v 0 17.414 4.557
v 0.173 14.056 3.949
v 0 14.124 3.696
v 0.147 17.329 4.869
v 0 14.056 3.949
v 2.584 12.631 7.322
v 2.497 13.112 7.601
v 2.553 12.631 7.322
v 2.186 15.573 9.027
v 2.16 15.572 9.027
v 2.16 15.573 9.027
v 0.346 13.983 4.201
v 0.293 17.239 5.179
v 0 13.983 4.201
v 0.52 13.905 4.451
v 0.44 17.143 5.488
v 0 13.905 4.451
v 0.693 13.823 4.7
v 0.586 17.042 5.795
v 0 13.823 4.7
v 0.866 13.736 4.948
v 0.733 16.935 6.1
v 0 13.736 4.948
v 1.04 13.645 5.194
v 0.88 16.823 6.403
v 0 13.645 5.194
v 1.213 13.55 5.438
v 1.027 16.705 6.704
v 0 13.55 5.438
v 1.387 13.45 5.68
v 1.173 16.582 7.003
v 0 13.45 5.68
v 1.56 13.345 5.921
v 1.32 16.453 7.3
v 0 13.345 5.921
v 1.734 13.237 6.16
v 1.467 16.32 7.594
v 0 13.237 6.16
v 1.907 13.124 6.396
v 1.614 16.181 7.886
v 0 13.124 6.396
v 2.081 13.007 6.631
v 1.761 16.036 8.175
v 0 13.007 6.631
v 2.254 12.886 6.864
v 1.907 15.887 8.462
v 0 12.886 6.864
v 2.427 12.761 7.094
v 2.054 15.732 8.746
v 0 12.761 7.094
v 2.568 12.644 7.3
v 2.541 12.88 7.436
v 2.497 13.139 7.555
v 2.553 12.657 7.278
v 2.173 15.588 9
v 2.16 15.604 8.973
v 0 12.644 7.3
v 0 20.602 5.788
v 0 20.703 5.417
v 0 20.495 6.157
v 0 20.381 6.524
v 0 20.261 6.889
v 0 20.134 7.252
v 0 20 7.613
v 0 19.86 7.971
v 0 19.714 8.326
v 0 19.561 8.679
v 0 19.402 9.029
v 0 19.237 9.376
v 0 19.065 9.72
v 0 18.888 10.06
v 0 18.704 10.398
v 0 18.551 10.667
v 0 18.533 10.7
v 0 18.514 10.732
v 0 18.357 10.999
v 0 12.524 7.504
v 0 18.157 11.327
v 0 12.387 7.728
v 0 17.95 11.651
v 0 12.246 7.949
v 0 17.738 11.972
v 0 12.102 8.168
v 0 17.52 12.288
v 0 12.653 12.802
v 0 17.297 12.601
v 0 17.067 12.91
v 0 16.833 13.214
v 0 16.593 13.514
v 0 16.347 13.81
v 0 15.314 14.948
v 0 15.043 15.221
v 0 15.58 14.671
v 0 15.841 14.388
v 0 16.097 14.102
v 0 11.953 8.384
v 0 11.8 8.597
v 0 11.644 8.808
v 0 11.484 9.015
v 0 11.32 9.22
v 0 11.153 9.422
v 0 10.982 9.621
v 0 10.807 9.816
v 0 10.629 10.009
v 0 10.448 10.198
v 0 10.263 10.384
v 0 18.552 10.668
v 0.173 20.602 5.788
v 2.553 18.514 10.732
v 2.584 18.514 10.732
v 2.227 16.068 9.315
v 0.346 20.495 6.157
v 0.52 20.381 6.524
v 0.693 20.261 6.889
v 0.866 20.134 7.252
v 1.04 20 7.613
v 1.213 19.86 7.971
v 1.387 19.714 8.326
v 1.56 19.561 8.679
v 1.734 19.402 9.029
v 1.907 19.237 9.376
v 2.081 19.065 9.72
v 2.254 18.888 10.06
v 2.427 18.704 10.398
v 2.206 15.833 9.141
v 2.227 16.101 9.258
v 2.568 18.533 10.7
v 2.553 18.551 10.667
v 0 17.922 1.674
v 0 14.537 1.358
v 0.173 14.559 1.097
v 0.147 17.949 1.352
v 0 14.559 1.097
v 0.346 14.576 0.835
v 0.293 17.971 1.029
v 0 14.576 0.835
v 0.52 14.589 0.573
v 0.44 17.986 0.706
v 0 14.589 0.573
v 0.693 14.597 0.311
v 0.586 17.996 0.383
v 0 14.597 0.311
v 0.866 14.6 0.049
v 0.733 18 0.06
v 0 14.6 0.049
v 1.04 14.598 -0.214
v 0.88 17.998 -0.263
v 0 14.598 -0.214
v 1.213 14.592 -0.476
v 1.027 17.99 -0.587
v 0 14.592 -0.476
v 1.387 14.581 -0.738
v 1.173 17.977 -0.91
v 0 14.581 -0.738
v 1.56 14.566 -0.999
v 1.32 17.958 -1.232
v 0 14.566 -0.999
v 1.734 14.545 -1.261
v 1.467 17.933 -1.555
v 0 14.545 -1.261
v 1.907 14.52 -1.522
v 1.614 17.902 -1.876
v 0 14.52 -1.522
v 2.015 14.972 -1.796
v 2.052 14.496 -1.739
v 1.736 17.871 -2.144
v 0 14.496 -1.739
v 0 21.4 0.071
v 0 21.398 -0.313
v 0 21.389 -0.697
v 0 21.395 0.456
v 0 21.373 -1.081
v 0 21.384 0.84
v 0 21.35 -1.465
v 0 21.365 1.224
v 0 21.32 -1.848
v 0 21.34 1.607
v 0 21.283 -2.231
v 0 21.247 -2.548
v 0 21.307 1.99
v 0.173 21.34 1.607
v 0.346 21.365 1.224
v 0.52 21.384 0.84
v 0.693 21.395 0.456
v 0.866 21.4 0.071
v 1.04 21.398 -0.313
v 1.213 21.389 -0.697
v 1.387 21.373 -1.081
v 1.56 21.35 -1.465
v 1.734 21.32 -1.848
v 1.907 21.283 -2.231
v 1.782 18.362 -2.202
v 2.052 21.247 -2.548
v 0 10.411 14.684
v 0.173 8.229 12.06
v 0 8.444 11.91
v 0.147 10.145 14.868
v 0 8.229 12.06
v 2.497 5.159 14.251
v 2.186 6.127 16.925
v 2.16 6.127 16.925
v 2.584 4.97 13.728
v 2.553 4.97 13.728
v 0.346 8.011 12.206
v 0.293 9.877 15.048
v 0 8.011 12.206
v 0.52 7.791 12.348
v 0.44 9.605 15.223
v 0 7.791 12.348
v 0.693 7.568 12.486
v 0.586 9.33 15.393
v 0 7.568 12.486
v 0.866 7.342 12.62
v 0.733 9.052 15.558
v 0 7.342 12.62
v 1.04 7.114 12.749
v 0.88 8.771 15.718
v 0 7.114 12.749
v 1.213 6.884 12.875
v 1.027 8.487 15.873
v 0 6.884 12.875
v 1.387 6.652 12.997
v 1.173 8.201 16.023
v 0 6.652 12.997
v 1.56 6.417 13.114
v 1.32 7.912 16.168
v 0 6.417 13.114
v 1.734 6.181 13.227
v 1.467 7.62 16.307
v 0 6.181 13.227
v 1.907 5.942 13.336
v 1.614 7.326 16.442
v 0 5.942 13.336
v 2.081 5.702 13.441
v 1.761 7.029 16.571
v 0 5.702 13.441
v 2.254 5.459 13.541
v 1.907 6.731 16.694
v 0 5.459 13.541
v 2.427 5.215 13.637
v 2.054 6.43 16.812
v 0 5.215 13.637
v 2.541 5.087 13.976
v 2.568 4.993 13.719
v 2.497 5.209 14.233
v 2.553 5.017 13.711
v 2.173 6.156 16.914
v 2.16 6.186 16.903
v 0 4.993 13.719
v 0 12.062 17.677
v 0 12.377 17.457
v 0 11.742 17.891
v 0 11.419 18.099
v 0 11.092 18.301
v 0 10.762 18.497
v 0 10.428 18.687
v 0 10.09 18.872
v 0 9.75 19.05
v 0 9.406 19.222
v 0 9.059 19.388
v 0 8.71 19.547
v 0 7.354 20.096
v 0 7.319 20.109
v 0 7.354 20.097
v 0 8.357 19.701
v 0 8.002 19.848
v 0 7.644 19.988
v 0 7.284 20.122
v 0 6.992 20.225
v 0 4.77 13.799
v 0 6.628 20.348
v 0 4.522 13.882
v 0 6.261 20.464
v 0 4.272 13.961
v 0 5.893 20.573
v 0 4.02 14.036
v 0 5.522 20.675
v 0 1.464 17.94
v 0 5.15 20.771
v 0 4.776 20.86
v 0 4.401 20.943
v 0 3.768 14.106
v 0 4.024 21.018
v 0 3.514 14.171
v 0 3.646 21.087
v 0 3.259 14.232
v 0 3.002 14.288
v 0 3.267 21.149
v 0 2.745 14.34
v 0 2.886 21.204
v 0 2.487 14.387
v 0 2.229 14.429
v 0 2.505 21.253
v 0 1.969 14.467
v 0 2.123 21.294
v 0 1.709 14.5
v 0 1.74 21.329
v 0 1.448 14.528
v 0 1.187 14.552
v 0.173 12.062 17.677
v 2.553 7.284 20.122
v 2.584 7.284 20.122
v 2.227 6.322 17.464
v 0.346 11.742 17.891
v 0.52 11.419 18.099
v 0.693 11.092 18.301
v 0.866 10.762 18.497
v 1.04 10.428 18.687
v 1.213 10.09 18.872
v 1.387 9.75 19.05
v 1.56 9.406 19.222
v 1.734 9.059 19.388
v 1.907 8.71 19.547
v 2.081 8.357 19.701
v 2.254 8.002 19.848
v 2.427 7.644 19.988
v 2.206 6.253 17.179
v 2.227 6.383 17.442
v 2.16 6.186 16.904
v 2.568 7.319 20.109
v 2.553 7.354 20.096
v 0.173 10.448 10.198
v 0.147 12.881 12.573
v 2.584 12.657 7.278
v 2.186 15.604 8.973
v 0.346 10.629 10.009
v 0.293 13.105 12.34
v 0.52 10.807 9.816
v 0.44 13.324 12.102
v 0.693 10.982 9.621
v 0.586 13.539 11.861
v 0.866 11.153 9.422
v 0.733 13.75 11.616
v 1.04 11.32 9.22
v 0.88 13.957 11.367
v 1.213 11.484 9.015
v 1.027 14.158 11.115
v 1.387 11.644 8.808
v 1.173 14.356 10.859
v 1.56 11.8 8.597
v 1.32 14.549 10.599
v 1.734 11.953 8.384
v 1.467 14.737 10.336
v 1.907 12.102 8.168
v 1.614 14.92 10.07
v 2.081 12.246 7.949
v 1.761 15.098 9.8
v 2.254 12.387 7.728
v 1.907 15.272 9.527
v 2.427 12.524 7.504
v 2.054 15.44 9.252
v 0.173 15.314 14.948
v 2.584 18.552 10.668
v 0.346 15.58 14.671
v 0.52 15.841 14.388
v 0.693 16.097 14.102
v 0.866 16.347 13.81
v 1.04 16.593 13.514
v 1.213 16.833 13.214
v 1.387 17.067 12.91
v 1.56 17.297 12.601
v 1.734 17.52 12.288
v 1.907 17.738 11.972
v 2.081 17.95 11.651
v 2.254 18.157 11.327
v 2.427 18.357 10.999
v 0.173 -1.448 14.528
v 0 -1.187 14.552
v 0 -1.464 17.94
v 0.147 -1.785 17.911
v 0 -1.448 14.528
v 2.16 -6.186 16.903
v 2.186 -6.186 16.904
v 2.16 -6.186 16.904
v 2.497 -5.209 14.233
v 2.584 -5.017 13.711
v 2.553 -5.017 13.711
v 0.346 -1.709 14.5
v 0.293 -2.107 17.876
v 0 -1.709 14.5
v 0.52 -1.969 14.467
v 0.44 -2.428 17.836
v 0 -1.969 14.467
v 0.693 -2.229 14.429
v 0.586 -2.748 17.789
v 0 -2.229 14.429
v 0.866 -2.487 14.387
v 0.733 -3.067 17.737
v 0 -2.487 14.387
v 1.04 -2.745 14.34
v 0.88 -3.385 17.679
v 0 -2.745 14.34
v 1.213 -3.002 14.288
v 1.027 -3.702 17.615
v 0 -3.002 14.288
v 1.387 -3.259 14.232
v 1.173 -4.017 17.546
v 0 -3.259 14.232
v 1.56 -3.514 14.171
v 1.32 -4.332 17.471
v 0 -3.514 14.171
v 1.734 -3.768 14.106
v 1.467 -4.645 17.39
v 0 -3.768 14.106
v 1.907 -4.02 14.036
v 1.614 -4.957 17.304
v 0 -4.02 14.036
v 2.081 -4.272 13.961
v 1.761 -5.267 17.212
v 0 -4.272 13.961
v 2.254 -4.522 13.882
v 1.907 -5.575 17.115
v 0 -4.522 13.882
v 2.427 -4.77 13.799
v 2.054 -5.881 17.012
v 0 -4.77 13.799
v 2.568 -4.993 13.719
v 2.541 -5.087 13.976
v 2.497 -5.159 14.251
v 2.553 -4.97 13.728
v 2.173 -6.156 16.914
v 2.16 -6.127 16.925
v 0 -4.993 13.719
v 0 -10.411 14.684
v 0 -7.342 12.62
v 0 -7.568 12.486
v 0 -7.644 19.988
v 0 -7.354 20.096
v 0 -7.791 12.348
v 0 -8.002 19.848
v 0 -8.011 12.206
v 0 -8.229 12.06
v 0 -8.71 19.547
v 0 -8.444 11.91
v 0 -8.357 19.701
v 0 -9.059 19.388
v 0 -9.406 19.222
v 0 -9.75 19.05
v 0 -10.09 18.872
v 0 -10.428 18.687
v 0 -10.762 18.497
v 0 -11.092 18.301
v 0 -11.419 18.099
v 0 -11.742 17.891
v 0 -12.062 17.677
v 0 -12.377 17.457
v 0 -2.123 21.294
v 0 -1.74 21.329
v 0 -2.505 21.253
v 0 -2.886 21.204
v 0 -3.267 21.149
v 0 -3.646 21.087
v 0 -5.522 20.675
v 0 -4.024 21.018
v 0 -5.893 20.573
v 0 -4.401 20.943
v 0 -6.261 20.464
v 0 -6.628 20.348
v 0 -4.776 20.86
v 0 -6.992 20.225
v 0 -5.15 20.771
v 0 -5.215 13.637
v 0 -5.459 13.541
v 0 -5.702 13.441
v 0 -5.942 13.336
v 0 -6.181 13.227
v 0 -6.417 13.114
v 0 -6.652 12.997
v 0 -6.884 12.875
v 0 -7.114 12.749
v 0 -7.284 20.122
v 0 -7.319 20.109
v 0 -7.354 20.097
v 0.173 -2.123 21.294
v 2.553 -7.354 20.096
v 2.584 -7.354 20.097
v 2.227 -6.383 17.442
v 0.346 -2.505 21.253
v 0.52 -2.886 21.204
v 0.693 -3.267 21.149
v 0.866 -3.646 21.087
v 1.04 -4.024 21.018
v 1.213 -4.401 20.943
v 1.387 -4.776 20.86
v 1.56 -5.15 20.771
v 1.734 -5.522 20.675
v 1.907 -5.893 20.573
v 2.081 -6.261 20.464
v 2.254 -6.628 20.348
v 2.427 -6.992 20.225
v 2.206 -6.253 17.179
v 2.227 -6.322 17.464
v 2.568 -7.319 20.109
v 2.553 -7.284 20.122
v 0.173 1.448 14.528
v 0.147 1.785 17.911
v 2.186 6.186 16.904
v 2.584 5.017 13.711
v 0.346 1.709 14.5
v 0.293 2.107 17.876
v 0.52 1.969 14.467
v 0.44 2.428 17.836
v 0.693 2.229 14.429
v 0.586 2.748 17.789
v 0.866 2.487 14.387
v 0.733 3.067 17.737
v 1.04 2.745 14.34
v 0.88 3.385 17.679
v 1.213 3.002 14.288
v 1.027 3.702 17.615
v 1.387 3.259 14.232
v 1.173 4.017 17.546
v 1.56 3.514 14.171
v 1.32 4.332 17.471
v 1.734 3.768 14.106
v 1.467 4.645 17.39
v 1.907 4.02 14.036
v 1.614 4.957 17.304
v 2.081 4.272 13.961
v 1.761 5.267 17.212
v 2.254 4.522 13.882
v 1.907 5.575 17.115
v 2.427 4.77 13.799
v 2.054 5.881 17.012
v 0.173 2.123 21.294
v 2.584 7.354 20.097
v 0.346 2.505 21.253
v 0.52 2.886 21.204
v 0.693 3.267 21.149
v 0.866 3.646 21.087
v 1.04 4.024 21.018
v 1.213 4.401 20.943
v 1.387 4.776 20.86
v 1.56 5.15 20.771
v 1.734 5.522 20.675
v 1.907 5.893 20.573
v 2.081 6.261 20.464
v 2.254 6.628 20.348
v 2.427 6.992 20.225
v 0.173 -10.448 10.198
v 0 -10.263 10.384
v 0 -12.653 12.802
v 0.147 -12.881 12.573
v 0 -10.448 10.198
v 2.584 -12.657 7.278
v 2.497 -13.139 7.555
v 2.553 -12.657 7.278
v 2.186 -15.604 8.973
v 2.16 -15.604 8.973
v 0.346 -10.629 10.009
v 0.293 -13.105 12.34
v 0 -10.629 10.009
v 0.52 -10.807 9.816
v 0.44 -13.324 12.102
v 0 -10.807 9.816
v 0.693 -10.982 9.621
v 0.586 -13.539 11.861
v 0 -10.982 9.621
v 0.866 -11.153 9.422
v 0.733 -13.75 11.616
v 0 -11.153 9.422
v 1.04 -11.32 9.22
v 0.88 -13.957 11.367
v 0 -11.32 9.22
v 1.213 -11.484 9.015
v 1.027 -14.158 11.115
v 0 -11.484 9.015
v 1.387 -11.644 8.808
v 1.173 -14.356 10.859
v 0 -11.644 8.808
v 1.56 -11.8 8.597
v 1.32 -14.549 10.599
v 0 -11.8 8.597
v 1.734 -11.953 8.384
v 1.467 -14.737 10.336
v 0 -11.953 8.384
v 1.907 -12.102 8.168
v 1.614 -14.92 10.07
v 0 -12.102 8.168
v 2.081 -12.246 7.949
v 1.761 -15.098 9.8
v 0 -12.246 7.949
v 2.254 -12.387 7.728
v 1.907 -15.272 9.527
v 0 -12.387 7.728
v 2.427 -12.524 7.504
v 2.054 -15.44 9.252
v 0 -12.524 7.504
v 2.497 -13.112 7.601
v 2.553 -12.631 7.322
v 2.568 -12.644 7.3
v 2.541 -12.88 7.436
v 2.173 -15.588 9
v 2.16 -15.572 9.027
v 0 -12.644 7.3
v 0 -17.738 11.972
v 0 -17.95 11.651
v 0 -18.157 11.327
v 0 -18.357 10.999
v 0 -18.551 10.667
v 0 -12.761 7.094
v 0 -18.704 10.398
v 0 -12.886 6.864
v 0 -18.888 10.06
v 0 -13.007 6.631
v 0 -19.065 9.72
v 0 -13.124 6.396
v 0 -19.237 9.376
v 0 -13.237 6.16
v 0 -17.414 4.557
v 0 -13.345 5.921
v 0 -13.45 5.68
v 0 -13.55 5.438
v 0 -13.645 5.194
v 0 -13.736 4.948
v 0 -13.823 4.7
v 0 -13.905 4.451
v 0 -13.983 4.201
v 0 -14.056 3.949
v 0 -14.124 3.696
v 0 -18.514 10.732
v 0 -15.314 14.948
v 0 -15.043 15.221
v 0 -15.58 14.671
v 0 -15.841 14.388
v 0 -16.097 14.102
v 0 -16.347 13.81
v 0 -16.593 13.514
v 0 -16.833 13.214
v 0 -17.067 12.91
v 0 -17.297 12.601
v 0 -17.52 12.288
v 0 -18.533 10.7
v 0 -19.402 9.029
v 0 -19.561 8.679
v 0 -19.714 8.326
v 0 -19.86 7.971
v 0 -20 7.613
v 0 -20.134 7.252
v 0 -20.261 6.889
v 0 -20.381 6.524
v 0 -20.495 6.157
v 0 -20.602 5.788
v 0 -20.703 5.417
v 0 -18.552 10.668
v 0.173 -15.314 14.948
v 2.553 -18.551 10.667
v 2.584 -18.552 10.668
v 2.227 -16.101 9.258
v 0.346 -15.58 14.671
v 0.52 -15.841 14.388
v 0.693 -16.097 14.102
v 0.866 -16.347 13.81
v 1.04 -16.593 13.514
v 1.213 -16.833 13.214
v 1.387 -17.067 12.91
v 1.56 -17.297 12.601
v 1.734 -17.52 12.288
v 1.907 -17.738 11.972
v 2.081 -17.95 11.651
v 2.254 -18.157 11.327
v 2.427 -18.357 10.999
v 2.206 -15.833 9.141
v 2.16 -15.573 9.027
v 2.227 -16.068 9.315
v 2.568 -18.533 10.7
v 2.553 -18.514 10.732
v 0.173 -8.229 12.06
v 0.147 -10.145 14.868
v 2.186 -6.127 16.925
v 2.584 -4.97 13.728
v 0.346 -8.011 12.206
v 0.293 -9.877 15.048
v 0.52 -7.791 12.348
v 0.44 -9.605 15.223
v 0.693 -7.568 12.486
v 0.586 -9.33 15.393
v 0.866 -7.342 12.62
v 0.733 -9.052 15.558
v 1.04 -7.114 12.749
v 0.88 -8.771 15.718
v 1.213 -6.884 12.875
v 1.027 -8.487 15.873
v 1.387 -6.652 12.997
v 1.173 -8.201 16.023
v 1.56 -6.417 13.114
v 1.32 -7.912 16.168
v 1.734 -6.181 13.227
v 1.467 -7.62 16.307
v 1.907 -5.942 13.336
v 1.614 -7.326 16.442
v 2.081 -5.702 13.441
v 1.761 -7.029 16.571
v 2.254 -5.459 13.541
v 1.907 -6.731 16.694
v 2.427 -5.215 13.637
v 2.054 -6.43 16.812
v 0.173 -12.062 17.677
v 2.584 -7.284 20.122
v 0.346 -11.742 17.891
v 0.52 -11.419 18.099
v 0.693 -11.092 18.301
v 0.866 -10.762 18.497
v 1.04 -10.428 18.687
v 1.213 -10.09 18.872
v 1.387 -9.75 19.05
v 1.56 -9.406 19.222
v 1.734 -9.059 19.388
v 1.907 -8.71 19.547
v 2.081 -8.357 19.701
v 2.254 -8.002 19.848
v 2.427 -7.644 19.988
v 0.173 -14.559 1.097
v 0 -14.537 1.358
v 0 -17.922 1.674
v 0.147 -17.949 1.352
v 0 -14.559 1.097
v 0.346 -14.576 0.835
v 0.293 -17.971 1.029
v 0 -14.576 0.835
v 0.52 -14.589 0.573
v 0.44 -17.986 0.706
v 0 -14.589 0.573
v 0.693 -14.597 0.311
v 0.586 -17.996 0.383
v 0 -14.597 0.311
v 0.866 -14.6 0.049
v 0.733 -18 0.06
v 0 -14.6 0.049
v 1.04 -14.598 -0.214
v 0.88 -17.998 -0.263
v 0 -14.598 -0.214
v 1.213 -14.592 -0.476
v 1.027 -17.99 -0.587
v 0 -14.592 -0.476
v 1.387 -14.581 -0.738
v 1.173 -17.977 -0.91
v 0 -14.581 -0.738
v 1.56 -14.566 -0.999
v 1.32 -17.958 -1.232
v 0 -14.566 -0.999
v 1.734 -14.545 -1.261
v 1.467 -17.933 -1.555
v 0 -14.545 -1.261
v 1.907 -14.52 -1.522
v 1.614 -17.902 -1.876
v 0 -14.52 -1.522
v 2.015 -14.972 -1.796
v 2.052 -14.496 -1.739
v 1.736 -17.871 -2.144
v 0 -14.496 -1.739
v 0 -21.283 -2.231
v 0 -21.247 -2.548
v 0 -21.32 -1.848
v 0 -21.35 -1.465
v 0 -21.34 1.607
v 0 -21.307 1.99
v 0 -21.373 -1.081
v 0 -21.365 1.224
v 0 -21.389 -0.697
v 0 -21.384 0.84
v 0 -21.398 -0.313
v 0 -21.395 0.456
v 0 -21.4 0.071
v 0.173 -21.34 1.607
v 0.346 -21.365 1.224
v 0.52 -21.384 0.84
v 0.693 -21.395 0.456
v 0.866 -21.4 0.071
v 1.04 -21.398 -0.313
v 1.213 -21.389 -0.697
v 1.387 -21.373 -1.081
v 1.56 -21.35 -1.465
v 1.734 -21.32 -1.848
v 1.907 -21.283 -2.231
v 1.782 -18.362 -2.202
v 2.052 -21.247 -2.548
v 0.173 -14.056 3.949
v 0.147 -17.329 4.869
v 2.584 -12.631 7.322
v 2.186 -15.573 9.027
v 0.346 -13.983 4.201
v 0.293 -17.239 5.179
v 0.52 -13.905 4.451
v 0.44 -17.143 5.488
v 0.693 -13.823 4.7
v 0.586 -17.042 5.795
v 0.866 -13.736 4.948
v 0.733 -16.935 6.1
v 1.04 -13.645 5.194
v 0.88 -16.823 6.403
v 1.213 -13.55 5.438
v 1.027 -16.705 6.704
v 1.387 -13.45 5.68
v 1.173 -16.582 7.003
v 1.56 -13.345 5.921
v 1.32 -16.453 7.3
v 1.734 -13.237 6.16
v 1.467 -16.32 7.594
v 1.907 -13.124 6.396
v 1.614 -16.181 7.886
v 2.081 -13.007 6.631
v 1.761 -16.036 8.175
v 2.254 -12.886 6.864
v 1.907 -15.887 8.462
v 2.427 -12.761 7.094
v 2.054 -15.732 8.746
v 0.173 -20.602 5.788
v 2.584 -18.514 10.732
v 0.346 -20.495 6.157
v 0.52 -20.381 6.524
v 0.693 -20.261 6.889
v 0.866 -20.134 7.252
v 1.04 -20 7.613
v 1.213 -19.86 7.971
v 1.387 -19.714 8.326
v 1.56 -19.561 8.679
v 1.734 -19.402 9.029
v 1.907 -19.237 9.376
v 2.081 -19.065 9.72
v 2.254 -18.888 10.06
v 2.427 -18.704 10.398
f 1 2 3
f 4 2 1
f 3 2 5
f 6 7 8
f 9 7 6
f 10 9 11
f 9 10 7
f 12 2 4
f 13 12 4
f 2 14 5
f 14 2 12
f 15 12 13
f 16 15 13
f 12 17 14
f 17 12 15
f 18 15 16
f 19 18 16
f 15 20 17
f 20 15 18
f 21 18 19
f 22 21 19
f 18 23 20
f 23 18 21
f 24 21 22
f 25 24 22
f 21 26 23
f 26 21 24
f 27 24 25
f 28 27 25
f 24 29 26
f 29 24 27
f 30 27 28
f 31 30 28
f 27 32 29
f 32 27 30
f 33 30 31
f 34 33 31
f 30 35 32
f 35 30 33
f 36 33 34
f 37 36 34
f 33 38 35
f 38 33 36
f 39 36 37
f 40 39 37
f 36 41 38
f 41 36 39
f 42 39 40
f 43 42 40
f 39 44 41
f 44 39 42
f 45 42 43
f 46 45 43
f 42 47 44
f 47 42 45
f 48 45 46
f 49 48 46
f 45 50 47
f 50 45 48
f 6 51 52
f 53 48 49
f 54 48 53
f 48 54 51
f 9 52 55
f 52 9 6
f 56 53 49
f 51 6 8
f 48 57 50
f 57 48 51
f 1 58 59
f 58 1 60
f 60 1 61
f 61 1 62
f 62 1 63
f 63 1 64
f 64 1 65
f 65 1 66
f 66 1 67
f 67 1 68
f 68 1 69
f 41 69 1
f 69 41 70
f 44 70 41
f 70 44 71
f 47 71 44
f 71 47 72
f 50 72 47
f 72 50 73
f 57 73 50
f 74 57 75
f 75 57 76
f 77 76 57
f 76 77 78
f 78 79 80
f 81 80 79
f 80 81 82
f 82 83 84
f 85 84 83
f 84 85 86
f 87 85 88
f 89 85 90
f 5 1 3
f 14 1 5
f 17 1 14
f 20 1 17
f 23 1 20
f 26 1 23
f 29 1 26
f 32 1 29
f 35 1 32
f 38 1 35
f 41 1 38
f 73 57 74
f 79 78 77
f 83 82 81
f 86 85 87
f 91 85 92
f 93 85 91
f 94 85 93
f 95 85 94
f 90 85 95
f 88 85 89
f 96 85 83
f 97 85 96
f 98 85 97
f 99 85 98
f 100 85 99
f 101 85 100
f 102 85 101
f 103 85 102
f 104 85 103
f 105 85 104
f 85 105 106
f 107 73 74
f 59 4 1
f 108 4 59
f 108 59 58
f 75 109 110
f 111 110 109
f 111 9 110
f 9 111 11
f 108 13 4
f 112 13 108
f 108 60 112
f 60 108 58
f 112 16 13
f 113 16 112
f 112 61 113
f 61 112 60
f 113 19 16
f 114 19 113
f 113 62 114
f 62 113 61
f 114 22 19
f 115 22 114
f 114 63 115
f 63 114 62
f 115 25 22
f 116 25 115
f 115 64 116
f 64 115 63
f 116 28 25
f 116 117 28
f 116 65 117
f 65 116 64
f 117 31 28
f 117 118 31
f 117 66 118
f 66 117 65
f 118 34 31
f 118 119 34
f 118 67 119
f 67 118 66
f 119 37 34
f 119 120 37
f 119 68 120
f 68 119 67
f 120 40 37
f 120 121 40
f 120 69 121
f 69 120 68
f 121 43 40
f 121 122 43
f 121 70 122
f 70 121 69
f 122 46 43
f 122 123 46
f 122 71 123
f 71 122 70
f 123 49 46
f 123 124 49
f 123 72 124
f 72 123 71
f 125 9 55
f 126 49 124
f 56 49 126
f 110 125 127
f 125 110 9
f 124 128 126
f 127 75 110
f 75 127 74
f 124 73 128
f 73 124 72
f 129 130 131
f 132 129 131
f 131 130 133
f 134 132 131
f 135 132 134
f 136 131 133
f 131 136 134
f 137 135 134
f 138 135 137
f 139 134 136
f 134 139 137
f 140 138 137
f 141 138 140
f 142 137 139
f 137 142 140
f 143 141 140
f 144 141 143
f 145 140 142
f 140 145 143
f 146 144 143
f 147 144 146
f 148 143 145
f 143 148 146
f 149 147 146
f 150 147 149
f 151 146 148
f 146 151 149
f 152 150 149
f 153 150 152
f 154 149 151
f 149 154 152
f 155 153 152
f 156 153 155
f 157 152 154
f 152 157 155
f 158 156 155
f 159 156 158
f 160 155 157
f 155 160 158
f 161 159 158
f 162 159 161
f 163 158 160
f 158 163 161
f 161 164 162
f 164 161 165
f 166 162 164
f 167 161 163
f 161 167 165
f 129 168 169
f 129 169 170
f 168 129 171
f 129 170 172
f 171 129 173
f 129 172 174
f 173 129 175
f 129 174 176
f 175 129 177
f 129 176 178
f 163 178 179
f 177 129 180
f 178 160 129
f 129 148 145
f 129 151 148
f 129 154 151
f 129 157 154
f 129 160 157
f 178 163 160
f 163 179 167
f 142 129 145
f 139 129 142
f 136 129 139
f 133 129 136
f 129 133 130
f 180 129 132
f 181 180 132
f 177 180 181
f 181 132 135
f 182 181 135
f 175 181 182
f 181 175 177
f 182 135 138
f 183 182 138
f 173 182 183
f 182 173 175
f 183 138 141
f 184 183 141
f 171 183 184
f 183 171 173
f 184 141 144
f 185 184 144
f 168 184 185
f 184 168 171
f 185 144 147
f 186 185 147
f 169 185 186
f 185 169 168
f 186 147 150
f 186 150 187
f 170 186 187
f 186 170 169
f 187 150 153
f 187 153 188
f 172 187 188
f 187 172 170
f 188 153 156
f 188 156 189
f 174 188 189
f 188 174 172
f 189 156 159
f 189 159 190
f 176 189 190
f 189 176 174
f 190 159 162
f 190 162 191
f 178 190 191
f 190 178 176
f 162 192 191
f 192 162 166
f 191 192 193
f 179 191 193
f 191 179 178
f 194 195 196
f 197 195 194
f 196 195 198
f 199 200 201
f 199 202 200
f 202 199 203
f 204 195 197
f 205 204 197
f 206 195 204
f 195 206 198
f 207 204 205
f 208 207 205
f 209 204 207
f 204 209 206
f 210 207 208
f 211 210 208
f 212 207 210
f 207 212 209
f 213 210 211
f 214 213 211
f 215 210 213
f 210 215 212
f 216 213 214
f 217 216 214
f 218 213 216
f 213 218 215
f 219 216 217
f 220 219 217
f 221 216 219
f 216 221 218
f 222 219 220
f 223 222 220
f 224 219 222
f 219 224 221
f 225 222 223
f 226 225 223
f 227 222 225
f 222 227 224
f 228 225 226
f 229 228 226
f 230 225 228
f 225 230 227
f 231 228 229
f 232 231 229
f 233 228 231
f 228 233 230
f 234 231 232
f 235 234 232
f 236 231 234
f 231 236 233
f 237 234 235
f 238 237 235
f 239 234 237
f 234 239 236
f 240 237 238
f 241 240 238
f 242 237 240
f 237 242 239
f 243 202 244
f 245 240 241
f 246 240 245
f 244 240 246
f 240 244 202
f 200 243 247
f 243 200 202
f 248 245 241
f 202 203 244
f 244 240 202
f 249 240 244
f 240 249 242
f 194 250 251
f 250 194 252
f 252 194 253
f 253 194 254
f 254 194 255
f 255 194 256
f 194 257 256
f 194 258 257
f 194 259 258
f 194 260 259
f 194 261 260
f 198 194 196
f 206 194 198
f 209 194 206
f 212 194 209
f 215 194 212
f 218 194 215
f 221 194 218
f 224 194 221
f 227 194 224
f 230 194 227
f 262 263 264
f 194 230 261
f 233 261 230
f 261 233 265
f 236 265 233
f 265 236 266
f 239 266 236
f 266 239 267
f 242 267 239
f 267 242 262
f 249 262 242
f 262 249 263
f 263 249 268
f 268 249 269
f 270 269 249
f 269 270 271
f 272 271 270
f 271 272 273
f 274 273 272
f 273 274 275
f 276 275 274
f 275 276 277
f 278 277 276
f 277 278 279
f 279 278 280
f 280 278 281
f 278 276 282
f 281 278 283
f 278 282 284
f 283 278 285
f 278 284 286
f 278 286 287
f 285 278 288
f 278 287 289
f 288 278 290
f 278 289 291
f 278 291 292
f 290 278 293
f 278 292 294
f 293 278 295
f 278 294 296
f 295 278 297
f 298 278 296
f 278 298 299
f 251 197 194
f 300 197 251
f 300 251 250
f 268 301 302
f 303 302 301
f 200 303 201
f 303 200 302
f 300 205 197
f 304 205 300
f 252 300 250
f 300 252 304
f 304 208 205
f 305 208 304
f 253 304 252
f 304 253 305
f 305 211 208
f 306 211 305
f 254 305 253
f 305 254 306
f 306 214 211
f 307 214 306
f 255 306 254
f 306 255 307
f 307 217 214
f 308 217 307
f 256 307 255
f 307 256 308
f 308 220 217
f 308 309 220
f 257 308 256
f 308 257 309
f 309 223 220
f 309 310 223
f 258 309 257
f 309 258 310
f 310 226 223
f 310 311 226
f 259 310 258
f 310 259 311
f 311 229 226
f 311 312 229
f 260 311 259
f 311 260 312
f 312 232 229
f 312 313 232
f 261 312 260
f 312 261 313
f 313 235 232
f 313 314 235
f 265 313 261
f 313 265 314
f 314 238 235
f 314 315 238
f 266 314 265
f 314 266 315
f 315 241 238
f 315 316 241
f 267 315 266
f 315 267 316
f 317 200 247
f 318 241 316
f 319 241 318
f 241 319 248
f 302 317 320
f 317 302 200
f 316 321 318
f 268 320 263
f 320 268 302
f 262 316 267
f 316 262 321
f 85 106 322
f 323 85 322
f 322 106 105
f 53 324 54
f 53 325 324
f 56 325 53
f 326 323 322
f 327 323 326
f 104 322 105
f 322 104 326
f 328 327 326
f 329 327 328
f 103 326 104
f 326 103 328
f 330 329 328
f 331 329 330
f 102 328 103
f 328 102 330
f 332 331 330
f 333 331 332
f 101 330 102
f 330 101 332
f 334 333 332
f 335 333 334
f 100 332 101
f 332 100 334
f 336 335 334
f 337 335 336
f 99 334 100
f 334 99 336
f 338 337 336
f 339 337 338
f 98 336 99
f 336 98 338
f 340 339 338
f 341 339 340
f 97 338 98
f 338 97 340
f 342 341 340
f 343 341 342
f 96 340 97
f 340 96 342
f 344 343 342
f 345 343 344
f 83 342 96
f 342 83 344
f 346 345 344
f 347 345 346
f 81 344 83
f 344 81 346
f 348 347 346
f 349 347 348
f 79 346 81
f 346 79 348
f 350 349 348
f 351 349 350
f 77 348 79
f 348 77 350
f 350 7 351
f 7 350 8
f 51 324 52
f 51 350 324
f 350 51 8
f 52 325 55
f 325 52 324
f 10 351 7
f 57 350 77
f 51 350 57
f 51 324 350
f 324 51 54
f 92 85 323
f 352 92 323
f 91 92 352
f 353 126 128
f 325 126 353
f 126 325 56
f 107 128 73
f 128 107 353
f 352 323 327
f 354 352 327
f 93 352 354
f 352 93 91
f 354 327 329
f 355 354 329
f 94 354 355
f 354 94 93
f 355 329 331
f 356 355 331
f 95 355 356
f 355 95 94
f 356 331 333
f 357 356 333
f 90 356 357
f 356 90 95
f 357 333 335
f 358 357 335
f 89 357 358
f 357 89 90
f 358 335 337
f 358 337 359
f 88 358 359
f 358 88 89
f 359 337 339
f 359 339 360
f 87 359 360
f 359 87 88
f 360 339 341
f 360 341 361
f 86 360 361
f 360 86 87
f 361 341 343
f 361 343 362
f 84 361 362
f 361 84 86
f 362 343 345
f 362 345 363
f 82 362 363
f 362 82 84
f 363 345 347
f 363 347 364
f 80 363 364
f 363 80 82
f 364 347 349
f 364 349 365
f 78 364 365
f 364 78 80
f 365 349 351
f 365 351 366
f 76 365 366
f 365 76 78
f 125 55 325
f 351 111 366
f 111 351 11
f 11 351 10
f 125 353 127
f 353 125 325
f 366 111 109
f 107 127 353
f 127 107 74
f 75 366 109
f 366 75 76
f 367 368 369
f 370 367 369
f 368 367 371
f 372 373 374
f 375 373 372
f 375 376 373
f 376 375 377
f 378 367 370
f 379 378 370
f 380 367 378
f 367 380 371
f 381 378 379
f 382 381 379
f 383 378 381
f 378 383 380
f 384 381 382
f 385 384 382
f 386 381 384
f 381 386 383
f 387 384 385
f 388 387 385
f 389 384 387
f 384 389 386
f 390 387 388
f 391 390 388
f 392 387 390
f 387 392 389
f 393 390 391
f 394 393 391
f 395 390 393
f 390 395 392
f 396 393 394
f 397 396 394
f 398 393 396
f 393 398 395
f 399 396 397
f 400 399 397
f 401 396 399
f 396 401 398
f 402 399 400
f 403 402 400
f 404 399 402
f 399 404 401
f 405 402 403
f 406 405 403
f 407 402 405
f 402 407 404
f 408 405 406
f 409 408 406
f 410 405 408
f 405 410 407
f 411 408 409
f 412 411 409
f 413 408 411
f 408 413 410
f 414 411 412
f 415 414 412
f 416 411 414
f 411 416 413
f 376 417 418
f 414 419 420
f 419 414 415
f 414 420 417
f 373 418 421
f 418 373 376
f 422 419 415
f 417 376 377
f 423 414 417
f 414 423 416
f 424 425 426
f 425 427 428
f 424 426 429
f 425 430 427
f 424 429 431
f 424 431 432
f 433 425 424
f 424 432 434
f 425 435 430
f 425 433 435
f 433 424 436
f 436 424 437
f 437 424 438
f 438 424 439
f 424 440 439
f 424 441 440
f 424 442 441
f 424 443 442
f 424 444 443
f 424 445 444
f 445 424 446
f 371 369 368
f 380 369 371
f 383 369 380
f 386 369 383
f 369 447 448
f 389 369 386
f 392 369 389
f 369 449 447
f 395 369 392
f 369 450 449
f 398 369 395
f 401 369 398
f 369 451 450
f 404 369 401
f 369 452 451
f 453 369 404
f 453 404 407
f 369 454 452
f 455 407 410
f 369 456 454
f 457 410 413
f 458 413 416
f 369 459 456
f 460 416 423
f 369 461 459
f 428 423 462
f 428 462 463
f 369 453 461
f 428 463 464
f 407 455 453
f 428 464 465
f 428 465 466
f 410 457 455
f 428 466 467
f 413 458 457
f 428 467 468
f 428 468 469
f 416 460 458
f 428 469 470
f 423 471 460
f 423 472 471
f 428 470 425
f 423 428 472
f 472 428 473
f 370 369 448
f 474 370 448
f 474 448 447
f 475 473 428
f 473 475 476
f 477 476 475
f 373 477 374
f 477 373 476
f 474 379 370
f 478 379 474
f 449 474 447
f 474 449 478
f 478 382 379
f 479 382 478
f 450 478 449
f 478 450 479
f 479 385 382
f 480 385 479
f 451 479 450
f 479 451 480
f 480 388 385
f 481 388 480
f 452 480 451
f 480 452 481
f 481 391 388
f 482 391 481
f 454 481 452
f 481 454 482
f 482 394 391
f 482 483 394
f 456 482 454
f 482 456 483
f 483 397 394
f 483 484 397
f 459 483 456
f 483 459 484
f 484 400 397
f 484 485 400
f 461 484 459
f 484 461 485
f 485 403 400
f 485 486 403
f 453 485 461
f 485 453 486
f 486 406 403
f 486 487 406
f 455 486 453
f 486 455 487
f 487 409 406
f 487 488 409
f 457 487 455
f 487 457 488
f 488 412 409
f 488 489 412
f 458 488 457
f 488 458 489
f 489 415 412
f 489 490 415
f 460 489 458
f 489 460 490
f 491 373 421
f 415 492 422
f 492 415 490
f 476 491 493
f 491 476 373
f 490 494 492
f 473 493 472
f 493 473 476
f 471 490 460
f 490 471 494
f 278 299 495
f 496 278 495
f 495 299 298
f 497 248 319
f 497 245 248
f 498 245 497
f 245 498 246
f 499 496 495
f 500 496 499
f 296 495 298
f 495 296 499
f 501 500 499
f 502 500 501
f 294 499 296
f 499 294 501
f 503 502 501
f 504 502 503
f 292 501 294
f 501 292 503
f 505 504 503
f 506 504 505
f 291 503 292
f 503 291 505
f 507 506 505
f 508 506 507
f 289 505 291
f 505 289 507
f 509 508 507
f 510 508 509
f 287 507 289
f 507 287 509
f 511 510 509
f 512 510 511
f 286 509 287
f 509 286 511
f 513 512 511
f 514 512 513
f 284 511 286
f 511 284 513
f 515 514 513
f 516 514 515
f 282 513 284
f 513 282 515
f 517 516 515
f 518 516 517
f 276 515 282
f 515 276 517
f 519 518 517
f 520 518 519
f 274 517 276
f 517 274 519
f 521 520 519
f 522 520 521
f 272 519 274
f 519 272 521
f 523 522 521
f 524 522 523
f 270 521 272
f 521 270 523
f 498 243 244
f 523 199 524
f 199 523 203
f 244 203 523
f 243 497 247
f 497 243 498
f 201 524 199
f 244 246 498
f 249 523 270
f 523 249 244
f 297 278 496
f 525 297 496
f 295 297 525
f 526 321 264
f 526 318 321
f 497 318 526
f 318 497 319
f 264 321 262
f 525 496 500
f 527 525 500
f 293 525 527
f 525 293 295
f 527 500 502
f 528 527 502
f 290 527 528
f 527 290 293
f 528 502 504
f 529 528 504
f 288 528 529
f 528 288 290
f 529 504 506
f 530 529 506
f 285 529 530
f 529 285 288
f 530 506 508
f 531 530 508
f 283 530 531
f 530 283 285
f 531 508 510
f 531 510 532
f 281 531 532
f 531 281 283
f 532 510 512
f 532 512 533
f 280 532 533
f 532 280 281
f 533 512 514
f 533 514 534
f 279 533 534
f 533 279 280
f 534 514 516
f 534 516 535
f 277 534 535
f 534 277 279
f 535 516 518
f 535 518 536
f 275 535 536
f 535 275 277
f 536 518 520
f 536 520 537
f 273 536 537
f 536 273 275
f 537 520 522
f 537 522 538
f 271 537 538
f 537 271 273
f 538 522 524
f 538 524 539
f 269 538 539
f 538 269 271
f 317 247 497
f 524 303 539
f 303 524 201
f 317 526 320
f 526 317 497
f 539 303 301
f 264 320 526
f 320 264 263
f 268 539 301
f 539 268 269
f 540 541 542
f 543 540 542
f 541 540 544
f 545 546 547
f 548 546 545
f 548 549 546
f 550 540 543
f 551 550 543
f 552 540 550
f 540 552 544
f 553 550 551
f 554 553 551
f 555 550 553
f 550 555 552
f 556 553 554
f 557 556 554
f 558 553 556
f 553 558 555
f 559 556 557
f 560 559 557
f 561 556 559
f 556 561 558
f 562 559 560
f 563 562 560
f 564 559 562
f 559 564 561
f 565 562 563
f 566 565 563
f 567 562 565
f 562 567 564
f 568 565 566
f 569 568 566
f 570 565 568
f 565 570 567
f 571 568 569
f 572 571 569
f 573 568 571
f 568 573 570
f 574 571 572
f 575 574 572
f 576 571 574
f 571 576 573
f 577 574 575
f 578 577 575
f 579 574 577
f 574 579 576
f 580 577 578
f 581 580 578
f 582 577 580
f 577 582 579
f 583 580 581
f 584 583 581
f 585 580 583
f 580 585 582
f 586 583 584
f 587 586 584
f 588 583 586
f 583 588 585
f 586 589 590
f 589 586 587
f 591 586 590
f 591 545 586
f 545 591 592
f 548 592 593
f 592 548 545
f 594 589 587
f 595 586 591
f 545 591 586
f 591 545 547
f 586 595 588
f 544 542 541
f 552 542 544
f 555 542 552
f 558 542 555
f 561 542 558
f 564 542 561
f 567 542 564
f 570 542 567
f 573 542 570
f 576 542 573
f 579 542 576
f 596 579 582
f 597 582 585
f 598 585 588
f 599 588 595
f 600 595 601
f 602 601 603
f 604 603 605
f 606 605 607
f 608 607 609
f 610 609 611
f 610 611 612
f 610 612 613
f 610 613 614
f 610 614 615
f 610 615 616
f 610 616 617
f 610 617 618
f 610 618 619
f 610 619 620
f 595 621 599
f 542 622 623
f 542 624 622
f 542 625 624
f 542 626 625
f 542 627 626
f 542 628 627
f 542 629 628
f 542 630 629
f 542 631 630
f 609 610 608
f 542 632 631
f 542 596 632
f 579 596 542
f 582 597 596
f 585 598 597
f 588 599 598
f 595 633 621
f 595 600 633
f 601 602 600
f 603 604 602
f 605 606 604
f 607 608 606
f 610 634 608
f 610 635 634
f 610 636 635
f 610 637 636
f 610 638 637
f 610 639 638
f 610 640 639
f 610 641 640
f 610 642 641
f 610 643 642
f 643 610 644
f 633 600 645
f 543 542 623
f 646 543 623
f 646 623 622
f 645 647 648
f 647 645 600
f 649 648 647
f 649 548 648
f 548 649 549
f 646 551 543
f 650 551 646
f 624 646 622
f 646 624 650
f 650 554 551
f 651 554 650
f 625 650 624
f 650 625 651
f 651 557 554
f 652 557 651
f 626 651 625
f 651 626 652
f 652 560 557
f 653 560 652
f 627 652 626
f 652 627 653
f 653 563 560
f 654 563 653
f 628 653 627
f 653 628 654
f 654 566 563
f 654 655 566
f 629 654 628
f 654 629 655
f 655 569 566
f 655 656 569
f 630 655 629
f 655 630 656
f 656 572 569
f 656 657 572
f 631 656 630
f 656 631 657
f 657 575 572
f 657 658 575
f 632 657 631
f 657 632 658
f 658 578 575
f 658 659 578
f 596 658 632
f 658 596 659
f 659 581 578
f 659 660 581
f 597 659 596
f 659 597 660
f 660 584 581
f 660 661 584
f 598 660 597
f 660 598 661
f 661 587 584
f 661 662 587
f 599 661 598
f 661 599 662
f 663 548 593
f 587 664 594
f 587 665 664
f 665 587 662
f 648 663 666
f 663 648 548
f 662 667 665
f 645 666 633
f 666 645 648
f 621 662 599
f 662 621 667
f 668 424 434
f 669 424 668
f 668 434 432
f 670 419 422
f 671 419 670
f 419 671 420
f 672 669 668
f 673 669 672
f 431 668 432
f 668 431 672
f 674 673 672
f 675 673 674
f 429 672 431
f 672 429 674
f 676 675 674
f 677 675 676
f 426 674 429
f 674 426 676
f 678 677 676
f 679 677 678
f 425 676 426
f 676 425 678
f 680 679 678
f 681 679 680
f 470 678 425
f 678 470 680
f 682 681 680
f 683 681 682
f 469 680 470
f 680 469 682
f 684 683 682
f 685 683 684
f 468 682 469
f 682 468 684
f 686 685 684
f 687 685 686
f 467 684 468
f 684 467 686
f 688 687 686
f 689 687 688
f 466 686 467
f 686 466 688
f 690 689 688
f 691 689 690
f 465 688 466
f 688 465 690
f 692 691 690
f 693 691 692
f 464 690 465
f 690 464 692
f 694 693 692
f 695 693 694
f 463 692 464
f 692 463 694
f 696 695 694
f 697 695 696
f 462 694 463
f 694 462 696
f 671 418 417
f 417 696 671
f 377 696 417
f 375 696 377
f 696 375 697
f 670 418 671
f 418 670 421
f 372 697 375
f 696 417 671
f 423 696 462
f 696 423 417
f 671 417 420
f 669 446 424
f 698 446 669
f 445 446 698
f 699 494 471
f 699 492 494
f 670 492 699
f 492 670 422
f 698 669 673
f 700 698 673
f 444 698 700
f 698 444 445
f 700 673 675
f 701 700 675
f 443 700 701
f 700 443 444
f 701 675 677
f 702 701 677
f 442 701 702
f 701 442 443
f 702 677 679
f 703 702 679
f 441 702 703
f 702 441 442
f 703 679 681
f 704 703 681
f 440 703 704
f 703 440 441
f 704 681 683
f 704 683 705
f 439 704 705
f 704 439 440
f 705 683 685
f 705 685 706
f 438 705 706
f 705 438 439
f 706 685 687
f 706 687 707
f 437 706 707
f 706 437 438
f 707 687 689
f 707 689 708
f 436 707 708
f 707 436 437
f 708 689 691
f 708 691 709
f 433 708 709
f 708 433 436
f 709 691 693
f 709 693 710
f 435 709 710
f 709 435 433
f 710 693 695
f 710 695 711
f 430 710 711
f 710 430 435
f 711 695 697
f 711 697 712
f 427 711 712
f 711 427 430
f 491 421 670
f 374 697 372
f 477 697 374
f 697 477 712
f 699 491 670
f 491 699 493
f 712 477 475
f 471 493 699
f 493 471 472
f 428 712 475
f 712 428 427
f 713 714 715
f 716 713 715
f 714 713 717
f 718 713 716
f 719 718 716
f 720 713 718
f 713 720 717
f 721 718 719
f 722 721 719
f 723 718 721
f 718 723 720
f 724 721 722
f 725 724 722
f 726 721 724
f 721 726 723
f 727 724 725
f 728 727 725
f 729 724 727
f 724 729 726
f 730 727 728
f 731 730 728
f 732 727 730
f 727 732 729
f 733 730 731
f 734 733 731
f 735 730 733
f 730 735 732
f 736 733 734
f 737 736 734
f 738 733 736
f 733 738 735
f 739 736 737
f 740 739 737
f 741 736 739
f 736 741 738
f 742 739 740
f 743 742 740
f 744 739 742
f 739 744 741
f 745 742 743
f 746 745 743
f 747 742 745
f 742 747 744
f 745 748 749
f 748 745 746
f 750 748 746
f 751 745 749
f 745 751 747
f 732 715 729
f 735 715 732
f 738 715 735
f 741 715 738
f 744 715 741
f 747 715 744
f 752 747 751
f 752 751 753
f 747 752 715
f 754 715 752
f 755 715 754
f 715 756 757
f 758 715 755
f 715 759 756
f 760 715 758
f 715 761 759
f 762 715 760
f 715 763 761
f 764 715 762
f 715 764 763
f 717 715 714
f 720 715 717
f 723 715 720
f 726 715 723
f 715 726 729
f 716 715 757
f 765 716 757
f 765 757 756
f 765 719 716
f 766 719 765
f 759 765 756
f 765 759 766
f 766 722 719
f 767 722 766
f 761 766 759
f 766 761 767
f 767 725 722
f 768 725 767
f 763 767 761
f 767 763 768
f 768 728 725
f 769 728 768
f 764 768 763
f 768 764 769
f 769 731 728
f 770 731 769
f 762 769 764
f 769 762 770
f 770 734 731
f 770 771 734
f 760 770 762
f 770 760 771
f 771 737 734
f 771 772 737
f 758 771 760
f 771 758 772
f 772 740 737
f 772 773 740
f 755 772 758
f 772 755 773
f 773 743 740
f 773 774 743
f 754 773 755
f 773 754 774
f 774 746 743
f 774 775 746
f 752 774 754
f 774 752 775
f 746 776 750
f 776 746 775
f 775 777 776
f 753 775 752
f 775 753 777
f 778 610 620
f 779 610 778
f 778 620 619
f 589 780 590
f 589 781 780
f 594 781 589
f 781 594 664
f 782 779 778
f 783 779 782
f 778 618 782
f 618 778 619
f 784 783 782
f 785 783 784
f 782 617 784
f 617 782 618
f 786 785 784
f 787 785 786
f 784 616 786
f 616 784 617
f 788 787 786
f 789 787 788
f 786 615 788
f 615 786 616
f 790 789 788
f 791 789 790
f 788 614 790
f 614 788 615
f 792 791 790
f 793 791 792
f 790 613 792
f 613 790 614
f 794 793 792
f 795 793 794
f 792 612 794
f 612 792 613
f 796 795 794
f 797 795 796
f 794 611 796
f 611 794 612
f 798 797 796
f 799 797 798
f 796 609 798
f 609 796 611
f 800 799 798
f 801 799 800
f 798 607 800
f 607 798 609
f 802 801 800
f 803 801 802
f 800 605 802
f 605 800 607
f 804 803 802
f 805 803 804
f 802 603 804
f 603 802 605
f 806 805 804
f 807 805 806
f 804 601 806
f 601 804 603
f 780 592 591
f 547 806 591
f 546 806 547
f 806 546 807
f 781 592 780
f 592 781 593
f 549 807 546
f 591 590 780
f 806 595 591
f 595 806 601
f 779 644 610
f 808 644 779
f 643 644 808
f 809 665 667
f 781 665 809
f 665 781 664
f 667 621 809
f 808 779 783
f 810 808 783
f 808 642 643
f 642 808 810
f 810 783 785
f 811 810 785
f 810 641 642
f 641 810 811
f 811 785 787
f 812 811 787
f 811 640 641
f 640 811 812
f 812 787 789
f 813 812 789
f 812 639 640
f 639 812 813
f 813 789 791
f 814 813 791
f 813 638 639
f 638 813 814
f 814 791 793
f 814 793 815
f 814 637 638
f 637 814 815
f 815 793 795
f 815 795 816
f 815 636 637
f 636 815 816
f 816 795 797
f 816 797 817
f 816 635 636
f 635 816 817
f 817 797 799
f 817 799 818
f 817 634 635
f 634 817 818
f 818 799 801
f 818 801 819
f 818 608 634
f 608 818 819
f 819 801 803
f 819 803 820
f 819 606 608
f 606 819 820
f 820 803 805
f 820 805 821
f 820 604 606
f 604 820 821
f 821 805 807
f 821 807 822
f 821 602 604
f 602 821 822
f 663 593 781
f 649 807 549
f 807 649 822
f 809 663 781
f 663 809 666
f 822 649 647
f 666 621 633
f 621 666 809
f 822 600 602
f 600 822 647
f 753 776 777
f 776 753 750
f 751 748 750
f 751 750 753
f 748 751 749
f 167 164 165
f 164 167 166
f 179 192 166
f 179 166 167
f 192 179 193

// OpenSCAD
TRACK_RADIUS = 18;
POSITIONS = 5;
MOVEMENT_RANGE = 160; // degrees
ANGLE_BETWEEN = MOVEMENT_RANGE / (POSITIONS - 1);

ROTATOR_WIDTH = 8;
ROTATOR_ANGLE = asin(ROTATOR_WIDTH / 2 / TRACK_RADIUS) * 2;
EXTRA_ANGLE = 8;

CUTOUT_SIZE = 3;

TRACK_SIZE = 6.8;
TRACK_OUTER_RADIUS = TRACK_RADIUS + TRACK_SIZE / 2;
TRACK_INNER_RADIUS = TRACK_RADIUS - TRACK_SIZE / 2;
TRACK_OUTER_HEIGHT = 2.6;
TRACK_INNER_HEIGHT = 2.2;
TRACK_START = atan((CUTOUT_SIZE / 2) / TRACK_RADIUS);

// CURVED_RAMP
function cumsum(vec) = [
    for (a=0, b=vec[0]; a < len(vec); a = a + 1, b = b + (vec[a] == undef ? 0 : vec[a])) b
];
function tri_sin(x, iter=32) = cumsum(
    [for (n=[1:2:iter*2]) (-1) ^ ((n - 1) / 2) * sin(n * x) / n ^ 2]
)[iter - 1] * 8 / PI ^ 2;

module curved_ramp(h, r_inner, r_outer, angle, fac_inner=1, fac_outer=1) {
    fn = $fn == undef || $fn == 0 ? 16 : $fn;
    function curve(r, x) = tri_sin(x / angle * 90) * h;
    function points(r) = [
        for (x = [angle / (fn - 1):angle / (fn - 1):angle])
        [r * cos(x), r * sin(x), curve(r, x)]
    ];
    function fac_z(points, fac) = [
        for (i = [0:len(points) - 1])
        [points[i].x, points[i].y, points[i].z * fac]
    ];

    start = [
        [r_inner, 0, 0],
        [r_outer, 0, 0],
    ];
    inner_top = fac_z(points(r_inner), fac_inner);
    inner_bot = fac_z(inner_top, 0);
    outer_top = fac_z(points(r_outer), fac_outer);
    outer_bot = fac_z(outer_top, 0);
    points = concat(start, inner_top, outer_top, inner_bot, outer_bot);

    end_faces = [
        [1, 0, 2],
        [2, fn + 1, 1],
        [0, 1, fn * 3 - 1, fn * 2],
        [0, fn * 2, 2],
        [1, fn + 1, fn * 3 - 1],
        [fn * 2 - 1, fn, fn * 3 - 2, fn * 4 - 3],
    ];
    segment_faces = [
        each for (i = [0:fn - 3]) [
            [fn + i + 1, i + 2, i + 3], // top 1
            [i + 3, fn + i + 2, fn + i + 1], // top 2
            [i + 3, i + 2, fn * 2 + i, fn * 2 + i + 1], // side inner
            [fn + i + 1, fn + i + 2, fn * 3 + i, fn * 3 - 1 + i], // side outer
            [fn * 2 + i + 1, fn * 2 + i, fn * 3 + i - 1, fn * 3 + i], // bottom
        ]
    ];
    faces = concat(end_faces, segment_faces);

    polyhedron(points, faces);
}

module curved_ramp_v(h_inner, h_outer, r_inner, r_outer, angle) {
    fac_inner = h_inner / h_outer;
    r_mid = (r_inner + r_outer) / 2;
    union() {
        curved_ramp(h_outer, r_inner, r_mid, angle, fac_outer=fac_inner);
        curved_ramp(h_outer, r_mid, r_outer, angle, fac_inner=fac_inner);
    };
}

// CURVED_RAMP

difference() {
    rotate([180, -90, 0])
    for (position = [0:POSITIONS-1]) {
        echo(floor(POSITIONS / 2) + 0.5);
        rotate([0, 0, (position - POSITIONS / 2 + 0.5) * ANGLE_BETWEEN])
        for (m = [0:1]) {
            mirror([0, m, 0])
            rotate([0, 0, TRACK_START - 0.1])
            curved_ramp_v(
                TRACK_INNER_HEIGHT,
                TRACK_OUTER_HEIGHT,
                TRACK_INNER_RADIUS, 
                TRACK_OUTER_RADIUS,
                ANGLE_BETWEEN / 2 - TRACK_START + 0.2,
                $fn=16
            );
        };
    }
    for (m = [0:1]) {
        mirror([0, m, 0])
        rotate([90 + (ROTATOR_ANGLE + MOVEMENT_RANGE + EXTRA_ANGLE) / 2, 0, 0])
        translate([-TRACK_OUTER_HEIGHT, 0, 0])
        cube([TRACK_OUTER_HEIGHT * 2, TRACK_OUTER_RADIUS, 10]);
    }
}
